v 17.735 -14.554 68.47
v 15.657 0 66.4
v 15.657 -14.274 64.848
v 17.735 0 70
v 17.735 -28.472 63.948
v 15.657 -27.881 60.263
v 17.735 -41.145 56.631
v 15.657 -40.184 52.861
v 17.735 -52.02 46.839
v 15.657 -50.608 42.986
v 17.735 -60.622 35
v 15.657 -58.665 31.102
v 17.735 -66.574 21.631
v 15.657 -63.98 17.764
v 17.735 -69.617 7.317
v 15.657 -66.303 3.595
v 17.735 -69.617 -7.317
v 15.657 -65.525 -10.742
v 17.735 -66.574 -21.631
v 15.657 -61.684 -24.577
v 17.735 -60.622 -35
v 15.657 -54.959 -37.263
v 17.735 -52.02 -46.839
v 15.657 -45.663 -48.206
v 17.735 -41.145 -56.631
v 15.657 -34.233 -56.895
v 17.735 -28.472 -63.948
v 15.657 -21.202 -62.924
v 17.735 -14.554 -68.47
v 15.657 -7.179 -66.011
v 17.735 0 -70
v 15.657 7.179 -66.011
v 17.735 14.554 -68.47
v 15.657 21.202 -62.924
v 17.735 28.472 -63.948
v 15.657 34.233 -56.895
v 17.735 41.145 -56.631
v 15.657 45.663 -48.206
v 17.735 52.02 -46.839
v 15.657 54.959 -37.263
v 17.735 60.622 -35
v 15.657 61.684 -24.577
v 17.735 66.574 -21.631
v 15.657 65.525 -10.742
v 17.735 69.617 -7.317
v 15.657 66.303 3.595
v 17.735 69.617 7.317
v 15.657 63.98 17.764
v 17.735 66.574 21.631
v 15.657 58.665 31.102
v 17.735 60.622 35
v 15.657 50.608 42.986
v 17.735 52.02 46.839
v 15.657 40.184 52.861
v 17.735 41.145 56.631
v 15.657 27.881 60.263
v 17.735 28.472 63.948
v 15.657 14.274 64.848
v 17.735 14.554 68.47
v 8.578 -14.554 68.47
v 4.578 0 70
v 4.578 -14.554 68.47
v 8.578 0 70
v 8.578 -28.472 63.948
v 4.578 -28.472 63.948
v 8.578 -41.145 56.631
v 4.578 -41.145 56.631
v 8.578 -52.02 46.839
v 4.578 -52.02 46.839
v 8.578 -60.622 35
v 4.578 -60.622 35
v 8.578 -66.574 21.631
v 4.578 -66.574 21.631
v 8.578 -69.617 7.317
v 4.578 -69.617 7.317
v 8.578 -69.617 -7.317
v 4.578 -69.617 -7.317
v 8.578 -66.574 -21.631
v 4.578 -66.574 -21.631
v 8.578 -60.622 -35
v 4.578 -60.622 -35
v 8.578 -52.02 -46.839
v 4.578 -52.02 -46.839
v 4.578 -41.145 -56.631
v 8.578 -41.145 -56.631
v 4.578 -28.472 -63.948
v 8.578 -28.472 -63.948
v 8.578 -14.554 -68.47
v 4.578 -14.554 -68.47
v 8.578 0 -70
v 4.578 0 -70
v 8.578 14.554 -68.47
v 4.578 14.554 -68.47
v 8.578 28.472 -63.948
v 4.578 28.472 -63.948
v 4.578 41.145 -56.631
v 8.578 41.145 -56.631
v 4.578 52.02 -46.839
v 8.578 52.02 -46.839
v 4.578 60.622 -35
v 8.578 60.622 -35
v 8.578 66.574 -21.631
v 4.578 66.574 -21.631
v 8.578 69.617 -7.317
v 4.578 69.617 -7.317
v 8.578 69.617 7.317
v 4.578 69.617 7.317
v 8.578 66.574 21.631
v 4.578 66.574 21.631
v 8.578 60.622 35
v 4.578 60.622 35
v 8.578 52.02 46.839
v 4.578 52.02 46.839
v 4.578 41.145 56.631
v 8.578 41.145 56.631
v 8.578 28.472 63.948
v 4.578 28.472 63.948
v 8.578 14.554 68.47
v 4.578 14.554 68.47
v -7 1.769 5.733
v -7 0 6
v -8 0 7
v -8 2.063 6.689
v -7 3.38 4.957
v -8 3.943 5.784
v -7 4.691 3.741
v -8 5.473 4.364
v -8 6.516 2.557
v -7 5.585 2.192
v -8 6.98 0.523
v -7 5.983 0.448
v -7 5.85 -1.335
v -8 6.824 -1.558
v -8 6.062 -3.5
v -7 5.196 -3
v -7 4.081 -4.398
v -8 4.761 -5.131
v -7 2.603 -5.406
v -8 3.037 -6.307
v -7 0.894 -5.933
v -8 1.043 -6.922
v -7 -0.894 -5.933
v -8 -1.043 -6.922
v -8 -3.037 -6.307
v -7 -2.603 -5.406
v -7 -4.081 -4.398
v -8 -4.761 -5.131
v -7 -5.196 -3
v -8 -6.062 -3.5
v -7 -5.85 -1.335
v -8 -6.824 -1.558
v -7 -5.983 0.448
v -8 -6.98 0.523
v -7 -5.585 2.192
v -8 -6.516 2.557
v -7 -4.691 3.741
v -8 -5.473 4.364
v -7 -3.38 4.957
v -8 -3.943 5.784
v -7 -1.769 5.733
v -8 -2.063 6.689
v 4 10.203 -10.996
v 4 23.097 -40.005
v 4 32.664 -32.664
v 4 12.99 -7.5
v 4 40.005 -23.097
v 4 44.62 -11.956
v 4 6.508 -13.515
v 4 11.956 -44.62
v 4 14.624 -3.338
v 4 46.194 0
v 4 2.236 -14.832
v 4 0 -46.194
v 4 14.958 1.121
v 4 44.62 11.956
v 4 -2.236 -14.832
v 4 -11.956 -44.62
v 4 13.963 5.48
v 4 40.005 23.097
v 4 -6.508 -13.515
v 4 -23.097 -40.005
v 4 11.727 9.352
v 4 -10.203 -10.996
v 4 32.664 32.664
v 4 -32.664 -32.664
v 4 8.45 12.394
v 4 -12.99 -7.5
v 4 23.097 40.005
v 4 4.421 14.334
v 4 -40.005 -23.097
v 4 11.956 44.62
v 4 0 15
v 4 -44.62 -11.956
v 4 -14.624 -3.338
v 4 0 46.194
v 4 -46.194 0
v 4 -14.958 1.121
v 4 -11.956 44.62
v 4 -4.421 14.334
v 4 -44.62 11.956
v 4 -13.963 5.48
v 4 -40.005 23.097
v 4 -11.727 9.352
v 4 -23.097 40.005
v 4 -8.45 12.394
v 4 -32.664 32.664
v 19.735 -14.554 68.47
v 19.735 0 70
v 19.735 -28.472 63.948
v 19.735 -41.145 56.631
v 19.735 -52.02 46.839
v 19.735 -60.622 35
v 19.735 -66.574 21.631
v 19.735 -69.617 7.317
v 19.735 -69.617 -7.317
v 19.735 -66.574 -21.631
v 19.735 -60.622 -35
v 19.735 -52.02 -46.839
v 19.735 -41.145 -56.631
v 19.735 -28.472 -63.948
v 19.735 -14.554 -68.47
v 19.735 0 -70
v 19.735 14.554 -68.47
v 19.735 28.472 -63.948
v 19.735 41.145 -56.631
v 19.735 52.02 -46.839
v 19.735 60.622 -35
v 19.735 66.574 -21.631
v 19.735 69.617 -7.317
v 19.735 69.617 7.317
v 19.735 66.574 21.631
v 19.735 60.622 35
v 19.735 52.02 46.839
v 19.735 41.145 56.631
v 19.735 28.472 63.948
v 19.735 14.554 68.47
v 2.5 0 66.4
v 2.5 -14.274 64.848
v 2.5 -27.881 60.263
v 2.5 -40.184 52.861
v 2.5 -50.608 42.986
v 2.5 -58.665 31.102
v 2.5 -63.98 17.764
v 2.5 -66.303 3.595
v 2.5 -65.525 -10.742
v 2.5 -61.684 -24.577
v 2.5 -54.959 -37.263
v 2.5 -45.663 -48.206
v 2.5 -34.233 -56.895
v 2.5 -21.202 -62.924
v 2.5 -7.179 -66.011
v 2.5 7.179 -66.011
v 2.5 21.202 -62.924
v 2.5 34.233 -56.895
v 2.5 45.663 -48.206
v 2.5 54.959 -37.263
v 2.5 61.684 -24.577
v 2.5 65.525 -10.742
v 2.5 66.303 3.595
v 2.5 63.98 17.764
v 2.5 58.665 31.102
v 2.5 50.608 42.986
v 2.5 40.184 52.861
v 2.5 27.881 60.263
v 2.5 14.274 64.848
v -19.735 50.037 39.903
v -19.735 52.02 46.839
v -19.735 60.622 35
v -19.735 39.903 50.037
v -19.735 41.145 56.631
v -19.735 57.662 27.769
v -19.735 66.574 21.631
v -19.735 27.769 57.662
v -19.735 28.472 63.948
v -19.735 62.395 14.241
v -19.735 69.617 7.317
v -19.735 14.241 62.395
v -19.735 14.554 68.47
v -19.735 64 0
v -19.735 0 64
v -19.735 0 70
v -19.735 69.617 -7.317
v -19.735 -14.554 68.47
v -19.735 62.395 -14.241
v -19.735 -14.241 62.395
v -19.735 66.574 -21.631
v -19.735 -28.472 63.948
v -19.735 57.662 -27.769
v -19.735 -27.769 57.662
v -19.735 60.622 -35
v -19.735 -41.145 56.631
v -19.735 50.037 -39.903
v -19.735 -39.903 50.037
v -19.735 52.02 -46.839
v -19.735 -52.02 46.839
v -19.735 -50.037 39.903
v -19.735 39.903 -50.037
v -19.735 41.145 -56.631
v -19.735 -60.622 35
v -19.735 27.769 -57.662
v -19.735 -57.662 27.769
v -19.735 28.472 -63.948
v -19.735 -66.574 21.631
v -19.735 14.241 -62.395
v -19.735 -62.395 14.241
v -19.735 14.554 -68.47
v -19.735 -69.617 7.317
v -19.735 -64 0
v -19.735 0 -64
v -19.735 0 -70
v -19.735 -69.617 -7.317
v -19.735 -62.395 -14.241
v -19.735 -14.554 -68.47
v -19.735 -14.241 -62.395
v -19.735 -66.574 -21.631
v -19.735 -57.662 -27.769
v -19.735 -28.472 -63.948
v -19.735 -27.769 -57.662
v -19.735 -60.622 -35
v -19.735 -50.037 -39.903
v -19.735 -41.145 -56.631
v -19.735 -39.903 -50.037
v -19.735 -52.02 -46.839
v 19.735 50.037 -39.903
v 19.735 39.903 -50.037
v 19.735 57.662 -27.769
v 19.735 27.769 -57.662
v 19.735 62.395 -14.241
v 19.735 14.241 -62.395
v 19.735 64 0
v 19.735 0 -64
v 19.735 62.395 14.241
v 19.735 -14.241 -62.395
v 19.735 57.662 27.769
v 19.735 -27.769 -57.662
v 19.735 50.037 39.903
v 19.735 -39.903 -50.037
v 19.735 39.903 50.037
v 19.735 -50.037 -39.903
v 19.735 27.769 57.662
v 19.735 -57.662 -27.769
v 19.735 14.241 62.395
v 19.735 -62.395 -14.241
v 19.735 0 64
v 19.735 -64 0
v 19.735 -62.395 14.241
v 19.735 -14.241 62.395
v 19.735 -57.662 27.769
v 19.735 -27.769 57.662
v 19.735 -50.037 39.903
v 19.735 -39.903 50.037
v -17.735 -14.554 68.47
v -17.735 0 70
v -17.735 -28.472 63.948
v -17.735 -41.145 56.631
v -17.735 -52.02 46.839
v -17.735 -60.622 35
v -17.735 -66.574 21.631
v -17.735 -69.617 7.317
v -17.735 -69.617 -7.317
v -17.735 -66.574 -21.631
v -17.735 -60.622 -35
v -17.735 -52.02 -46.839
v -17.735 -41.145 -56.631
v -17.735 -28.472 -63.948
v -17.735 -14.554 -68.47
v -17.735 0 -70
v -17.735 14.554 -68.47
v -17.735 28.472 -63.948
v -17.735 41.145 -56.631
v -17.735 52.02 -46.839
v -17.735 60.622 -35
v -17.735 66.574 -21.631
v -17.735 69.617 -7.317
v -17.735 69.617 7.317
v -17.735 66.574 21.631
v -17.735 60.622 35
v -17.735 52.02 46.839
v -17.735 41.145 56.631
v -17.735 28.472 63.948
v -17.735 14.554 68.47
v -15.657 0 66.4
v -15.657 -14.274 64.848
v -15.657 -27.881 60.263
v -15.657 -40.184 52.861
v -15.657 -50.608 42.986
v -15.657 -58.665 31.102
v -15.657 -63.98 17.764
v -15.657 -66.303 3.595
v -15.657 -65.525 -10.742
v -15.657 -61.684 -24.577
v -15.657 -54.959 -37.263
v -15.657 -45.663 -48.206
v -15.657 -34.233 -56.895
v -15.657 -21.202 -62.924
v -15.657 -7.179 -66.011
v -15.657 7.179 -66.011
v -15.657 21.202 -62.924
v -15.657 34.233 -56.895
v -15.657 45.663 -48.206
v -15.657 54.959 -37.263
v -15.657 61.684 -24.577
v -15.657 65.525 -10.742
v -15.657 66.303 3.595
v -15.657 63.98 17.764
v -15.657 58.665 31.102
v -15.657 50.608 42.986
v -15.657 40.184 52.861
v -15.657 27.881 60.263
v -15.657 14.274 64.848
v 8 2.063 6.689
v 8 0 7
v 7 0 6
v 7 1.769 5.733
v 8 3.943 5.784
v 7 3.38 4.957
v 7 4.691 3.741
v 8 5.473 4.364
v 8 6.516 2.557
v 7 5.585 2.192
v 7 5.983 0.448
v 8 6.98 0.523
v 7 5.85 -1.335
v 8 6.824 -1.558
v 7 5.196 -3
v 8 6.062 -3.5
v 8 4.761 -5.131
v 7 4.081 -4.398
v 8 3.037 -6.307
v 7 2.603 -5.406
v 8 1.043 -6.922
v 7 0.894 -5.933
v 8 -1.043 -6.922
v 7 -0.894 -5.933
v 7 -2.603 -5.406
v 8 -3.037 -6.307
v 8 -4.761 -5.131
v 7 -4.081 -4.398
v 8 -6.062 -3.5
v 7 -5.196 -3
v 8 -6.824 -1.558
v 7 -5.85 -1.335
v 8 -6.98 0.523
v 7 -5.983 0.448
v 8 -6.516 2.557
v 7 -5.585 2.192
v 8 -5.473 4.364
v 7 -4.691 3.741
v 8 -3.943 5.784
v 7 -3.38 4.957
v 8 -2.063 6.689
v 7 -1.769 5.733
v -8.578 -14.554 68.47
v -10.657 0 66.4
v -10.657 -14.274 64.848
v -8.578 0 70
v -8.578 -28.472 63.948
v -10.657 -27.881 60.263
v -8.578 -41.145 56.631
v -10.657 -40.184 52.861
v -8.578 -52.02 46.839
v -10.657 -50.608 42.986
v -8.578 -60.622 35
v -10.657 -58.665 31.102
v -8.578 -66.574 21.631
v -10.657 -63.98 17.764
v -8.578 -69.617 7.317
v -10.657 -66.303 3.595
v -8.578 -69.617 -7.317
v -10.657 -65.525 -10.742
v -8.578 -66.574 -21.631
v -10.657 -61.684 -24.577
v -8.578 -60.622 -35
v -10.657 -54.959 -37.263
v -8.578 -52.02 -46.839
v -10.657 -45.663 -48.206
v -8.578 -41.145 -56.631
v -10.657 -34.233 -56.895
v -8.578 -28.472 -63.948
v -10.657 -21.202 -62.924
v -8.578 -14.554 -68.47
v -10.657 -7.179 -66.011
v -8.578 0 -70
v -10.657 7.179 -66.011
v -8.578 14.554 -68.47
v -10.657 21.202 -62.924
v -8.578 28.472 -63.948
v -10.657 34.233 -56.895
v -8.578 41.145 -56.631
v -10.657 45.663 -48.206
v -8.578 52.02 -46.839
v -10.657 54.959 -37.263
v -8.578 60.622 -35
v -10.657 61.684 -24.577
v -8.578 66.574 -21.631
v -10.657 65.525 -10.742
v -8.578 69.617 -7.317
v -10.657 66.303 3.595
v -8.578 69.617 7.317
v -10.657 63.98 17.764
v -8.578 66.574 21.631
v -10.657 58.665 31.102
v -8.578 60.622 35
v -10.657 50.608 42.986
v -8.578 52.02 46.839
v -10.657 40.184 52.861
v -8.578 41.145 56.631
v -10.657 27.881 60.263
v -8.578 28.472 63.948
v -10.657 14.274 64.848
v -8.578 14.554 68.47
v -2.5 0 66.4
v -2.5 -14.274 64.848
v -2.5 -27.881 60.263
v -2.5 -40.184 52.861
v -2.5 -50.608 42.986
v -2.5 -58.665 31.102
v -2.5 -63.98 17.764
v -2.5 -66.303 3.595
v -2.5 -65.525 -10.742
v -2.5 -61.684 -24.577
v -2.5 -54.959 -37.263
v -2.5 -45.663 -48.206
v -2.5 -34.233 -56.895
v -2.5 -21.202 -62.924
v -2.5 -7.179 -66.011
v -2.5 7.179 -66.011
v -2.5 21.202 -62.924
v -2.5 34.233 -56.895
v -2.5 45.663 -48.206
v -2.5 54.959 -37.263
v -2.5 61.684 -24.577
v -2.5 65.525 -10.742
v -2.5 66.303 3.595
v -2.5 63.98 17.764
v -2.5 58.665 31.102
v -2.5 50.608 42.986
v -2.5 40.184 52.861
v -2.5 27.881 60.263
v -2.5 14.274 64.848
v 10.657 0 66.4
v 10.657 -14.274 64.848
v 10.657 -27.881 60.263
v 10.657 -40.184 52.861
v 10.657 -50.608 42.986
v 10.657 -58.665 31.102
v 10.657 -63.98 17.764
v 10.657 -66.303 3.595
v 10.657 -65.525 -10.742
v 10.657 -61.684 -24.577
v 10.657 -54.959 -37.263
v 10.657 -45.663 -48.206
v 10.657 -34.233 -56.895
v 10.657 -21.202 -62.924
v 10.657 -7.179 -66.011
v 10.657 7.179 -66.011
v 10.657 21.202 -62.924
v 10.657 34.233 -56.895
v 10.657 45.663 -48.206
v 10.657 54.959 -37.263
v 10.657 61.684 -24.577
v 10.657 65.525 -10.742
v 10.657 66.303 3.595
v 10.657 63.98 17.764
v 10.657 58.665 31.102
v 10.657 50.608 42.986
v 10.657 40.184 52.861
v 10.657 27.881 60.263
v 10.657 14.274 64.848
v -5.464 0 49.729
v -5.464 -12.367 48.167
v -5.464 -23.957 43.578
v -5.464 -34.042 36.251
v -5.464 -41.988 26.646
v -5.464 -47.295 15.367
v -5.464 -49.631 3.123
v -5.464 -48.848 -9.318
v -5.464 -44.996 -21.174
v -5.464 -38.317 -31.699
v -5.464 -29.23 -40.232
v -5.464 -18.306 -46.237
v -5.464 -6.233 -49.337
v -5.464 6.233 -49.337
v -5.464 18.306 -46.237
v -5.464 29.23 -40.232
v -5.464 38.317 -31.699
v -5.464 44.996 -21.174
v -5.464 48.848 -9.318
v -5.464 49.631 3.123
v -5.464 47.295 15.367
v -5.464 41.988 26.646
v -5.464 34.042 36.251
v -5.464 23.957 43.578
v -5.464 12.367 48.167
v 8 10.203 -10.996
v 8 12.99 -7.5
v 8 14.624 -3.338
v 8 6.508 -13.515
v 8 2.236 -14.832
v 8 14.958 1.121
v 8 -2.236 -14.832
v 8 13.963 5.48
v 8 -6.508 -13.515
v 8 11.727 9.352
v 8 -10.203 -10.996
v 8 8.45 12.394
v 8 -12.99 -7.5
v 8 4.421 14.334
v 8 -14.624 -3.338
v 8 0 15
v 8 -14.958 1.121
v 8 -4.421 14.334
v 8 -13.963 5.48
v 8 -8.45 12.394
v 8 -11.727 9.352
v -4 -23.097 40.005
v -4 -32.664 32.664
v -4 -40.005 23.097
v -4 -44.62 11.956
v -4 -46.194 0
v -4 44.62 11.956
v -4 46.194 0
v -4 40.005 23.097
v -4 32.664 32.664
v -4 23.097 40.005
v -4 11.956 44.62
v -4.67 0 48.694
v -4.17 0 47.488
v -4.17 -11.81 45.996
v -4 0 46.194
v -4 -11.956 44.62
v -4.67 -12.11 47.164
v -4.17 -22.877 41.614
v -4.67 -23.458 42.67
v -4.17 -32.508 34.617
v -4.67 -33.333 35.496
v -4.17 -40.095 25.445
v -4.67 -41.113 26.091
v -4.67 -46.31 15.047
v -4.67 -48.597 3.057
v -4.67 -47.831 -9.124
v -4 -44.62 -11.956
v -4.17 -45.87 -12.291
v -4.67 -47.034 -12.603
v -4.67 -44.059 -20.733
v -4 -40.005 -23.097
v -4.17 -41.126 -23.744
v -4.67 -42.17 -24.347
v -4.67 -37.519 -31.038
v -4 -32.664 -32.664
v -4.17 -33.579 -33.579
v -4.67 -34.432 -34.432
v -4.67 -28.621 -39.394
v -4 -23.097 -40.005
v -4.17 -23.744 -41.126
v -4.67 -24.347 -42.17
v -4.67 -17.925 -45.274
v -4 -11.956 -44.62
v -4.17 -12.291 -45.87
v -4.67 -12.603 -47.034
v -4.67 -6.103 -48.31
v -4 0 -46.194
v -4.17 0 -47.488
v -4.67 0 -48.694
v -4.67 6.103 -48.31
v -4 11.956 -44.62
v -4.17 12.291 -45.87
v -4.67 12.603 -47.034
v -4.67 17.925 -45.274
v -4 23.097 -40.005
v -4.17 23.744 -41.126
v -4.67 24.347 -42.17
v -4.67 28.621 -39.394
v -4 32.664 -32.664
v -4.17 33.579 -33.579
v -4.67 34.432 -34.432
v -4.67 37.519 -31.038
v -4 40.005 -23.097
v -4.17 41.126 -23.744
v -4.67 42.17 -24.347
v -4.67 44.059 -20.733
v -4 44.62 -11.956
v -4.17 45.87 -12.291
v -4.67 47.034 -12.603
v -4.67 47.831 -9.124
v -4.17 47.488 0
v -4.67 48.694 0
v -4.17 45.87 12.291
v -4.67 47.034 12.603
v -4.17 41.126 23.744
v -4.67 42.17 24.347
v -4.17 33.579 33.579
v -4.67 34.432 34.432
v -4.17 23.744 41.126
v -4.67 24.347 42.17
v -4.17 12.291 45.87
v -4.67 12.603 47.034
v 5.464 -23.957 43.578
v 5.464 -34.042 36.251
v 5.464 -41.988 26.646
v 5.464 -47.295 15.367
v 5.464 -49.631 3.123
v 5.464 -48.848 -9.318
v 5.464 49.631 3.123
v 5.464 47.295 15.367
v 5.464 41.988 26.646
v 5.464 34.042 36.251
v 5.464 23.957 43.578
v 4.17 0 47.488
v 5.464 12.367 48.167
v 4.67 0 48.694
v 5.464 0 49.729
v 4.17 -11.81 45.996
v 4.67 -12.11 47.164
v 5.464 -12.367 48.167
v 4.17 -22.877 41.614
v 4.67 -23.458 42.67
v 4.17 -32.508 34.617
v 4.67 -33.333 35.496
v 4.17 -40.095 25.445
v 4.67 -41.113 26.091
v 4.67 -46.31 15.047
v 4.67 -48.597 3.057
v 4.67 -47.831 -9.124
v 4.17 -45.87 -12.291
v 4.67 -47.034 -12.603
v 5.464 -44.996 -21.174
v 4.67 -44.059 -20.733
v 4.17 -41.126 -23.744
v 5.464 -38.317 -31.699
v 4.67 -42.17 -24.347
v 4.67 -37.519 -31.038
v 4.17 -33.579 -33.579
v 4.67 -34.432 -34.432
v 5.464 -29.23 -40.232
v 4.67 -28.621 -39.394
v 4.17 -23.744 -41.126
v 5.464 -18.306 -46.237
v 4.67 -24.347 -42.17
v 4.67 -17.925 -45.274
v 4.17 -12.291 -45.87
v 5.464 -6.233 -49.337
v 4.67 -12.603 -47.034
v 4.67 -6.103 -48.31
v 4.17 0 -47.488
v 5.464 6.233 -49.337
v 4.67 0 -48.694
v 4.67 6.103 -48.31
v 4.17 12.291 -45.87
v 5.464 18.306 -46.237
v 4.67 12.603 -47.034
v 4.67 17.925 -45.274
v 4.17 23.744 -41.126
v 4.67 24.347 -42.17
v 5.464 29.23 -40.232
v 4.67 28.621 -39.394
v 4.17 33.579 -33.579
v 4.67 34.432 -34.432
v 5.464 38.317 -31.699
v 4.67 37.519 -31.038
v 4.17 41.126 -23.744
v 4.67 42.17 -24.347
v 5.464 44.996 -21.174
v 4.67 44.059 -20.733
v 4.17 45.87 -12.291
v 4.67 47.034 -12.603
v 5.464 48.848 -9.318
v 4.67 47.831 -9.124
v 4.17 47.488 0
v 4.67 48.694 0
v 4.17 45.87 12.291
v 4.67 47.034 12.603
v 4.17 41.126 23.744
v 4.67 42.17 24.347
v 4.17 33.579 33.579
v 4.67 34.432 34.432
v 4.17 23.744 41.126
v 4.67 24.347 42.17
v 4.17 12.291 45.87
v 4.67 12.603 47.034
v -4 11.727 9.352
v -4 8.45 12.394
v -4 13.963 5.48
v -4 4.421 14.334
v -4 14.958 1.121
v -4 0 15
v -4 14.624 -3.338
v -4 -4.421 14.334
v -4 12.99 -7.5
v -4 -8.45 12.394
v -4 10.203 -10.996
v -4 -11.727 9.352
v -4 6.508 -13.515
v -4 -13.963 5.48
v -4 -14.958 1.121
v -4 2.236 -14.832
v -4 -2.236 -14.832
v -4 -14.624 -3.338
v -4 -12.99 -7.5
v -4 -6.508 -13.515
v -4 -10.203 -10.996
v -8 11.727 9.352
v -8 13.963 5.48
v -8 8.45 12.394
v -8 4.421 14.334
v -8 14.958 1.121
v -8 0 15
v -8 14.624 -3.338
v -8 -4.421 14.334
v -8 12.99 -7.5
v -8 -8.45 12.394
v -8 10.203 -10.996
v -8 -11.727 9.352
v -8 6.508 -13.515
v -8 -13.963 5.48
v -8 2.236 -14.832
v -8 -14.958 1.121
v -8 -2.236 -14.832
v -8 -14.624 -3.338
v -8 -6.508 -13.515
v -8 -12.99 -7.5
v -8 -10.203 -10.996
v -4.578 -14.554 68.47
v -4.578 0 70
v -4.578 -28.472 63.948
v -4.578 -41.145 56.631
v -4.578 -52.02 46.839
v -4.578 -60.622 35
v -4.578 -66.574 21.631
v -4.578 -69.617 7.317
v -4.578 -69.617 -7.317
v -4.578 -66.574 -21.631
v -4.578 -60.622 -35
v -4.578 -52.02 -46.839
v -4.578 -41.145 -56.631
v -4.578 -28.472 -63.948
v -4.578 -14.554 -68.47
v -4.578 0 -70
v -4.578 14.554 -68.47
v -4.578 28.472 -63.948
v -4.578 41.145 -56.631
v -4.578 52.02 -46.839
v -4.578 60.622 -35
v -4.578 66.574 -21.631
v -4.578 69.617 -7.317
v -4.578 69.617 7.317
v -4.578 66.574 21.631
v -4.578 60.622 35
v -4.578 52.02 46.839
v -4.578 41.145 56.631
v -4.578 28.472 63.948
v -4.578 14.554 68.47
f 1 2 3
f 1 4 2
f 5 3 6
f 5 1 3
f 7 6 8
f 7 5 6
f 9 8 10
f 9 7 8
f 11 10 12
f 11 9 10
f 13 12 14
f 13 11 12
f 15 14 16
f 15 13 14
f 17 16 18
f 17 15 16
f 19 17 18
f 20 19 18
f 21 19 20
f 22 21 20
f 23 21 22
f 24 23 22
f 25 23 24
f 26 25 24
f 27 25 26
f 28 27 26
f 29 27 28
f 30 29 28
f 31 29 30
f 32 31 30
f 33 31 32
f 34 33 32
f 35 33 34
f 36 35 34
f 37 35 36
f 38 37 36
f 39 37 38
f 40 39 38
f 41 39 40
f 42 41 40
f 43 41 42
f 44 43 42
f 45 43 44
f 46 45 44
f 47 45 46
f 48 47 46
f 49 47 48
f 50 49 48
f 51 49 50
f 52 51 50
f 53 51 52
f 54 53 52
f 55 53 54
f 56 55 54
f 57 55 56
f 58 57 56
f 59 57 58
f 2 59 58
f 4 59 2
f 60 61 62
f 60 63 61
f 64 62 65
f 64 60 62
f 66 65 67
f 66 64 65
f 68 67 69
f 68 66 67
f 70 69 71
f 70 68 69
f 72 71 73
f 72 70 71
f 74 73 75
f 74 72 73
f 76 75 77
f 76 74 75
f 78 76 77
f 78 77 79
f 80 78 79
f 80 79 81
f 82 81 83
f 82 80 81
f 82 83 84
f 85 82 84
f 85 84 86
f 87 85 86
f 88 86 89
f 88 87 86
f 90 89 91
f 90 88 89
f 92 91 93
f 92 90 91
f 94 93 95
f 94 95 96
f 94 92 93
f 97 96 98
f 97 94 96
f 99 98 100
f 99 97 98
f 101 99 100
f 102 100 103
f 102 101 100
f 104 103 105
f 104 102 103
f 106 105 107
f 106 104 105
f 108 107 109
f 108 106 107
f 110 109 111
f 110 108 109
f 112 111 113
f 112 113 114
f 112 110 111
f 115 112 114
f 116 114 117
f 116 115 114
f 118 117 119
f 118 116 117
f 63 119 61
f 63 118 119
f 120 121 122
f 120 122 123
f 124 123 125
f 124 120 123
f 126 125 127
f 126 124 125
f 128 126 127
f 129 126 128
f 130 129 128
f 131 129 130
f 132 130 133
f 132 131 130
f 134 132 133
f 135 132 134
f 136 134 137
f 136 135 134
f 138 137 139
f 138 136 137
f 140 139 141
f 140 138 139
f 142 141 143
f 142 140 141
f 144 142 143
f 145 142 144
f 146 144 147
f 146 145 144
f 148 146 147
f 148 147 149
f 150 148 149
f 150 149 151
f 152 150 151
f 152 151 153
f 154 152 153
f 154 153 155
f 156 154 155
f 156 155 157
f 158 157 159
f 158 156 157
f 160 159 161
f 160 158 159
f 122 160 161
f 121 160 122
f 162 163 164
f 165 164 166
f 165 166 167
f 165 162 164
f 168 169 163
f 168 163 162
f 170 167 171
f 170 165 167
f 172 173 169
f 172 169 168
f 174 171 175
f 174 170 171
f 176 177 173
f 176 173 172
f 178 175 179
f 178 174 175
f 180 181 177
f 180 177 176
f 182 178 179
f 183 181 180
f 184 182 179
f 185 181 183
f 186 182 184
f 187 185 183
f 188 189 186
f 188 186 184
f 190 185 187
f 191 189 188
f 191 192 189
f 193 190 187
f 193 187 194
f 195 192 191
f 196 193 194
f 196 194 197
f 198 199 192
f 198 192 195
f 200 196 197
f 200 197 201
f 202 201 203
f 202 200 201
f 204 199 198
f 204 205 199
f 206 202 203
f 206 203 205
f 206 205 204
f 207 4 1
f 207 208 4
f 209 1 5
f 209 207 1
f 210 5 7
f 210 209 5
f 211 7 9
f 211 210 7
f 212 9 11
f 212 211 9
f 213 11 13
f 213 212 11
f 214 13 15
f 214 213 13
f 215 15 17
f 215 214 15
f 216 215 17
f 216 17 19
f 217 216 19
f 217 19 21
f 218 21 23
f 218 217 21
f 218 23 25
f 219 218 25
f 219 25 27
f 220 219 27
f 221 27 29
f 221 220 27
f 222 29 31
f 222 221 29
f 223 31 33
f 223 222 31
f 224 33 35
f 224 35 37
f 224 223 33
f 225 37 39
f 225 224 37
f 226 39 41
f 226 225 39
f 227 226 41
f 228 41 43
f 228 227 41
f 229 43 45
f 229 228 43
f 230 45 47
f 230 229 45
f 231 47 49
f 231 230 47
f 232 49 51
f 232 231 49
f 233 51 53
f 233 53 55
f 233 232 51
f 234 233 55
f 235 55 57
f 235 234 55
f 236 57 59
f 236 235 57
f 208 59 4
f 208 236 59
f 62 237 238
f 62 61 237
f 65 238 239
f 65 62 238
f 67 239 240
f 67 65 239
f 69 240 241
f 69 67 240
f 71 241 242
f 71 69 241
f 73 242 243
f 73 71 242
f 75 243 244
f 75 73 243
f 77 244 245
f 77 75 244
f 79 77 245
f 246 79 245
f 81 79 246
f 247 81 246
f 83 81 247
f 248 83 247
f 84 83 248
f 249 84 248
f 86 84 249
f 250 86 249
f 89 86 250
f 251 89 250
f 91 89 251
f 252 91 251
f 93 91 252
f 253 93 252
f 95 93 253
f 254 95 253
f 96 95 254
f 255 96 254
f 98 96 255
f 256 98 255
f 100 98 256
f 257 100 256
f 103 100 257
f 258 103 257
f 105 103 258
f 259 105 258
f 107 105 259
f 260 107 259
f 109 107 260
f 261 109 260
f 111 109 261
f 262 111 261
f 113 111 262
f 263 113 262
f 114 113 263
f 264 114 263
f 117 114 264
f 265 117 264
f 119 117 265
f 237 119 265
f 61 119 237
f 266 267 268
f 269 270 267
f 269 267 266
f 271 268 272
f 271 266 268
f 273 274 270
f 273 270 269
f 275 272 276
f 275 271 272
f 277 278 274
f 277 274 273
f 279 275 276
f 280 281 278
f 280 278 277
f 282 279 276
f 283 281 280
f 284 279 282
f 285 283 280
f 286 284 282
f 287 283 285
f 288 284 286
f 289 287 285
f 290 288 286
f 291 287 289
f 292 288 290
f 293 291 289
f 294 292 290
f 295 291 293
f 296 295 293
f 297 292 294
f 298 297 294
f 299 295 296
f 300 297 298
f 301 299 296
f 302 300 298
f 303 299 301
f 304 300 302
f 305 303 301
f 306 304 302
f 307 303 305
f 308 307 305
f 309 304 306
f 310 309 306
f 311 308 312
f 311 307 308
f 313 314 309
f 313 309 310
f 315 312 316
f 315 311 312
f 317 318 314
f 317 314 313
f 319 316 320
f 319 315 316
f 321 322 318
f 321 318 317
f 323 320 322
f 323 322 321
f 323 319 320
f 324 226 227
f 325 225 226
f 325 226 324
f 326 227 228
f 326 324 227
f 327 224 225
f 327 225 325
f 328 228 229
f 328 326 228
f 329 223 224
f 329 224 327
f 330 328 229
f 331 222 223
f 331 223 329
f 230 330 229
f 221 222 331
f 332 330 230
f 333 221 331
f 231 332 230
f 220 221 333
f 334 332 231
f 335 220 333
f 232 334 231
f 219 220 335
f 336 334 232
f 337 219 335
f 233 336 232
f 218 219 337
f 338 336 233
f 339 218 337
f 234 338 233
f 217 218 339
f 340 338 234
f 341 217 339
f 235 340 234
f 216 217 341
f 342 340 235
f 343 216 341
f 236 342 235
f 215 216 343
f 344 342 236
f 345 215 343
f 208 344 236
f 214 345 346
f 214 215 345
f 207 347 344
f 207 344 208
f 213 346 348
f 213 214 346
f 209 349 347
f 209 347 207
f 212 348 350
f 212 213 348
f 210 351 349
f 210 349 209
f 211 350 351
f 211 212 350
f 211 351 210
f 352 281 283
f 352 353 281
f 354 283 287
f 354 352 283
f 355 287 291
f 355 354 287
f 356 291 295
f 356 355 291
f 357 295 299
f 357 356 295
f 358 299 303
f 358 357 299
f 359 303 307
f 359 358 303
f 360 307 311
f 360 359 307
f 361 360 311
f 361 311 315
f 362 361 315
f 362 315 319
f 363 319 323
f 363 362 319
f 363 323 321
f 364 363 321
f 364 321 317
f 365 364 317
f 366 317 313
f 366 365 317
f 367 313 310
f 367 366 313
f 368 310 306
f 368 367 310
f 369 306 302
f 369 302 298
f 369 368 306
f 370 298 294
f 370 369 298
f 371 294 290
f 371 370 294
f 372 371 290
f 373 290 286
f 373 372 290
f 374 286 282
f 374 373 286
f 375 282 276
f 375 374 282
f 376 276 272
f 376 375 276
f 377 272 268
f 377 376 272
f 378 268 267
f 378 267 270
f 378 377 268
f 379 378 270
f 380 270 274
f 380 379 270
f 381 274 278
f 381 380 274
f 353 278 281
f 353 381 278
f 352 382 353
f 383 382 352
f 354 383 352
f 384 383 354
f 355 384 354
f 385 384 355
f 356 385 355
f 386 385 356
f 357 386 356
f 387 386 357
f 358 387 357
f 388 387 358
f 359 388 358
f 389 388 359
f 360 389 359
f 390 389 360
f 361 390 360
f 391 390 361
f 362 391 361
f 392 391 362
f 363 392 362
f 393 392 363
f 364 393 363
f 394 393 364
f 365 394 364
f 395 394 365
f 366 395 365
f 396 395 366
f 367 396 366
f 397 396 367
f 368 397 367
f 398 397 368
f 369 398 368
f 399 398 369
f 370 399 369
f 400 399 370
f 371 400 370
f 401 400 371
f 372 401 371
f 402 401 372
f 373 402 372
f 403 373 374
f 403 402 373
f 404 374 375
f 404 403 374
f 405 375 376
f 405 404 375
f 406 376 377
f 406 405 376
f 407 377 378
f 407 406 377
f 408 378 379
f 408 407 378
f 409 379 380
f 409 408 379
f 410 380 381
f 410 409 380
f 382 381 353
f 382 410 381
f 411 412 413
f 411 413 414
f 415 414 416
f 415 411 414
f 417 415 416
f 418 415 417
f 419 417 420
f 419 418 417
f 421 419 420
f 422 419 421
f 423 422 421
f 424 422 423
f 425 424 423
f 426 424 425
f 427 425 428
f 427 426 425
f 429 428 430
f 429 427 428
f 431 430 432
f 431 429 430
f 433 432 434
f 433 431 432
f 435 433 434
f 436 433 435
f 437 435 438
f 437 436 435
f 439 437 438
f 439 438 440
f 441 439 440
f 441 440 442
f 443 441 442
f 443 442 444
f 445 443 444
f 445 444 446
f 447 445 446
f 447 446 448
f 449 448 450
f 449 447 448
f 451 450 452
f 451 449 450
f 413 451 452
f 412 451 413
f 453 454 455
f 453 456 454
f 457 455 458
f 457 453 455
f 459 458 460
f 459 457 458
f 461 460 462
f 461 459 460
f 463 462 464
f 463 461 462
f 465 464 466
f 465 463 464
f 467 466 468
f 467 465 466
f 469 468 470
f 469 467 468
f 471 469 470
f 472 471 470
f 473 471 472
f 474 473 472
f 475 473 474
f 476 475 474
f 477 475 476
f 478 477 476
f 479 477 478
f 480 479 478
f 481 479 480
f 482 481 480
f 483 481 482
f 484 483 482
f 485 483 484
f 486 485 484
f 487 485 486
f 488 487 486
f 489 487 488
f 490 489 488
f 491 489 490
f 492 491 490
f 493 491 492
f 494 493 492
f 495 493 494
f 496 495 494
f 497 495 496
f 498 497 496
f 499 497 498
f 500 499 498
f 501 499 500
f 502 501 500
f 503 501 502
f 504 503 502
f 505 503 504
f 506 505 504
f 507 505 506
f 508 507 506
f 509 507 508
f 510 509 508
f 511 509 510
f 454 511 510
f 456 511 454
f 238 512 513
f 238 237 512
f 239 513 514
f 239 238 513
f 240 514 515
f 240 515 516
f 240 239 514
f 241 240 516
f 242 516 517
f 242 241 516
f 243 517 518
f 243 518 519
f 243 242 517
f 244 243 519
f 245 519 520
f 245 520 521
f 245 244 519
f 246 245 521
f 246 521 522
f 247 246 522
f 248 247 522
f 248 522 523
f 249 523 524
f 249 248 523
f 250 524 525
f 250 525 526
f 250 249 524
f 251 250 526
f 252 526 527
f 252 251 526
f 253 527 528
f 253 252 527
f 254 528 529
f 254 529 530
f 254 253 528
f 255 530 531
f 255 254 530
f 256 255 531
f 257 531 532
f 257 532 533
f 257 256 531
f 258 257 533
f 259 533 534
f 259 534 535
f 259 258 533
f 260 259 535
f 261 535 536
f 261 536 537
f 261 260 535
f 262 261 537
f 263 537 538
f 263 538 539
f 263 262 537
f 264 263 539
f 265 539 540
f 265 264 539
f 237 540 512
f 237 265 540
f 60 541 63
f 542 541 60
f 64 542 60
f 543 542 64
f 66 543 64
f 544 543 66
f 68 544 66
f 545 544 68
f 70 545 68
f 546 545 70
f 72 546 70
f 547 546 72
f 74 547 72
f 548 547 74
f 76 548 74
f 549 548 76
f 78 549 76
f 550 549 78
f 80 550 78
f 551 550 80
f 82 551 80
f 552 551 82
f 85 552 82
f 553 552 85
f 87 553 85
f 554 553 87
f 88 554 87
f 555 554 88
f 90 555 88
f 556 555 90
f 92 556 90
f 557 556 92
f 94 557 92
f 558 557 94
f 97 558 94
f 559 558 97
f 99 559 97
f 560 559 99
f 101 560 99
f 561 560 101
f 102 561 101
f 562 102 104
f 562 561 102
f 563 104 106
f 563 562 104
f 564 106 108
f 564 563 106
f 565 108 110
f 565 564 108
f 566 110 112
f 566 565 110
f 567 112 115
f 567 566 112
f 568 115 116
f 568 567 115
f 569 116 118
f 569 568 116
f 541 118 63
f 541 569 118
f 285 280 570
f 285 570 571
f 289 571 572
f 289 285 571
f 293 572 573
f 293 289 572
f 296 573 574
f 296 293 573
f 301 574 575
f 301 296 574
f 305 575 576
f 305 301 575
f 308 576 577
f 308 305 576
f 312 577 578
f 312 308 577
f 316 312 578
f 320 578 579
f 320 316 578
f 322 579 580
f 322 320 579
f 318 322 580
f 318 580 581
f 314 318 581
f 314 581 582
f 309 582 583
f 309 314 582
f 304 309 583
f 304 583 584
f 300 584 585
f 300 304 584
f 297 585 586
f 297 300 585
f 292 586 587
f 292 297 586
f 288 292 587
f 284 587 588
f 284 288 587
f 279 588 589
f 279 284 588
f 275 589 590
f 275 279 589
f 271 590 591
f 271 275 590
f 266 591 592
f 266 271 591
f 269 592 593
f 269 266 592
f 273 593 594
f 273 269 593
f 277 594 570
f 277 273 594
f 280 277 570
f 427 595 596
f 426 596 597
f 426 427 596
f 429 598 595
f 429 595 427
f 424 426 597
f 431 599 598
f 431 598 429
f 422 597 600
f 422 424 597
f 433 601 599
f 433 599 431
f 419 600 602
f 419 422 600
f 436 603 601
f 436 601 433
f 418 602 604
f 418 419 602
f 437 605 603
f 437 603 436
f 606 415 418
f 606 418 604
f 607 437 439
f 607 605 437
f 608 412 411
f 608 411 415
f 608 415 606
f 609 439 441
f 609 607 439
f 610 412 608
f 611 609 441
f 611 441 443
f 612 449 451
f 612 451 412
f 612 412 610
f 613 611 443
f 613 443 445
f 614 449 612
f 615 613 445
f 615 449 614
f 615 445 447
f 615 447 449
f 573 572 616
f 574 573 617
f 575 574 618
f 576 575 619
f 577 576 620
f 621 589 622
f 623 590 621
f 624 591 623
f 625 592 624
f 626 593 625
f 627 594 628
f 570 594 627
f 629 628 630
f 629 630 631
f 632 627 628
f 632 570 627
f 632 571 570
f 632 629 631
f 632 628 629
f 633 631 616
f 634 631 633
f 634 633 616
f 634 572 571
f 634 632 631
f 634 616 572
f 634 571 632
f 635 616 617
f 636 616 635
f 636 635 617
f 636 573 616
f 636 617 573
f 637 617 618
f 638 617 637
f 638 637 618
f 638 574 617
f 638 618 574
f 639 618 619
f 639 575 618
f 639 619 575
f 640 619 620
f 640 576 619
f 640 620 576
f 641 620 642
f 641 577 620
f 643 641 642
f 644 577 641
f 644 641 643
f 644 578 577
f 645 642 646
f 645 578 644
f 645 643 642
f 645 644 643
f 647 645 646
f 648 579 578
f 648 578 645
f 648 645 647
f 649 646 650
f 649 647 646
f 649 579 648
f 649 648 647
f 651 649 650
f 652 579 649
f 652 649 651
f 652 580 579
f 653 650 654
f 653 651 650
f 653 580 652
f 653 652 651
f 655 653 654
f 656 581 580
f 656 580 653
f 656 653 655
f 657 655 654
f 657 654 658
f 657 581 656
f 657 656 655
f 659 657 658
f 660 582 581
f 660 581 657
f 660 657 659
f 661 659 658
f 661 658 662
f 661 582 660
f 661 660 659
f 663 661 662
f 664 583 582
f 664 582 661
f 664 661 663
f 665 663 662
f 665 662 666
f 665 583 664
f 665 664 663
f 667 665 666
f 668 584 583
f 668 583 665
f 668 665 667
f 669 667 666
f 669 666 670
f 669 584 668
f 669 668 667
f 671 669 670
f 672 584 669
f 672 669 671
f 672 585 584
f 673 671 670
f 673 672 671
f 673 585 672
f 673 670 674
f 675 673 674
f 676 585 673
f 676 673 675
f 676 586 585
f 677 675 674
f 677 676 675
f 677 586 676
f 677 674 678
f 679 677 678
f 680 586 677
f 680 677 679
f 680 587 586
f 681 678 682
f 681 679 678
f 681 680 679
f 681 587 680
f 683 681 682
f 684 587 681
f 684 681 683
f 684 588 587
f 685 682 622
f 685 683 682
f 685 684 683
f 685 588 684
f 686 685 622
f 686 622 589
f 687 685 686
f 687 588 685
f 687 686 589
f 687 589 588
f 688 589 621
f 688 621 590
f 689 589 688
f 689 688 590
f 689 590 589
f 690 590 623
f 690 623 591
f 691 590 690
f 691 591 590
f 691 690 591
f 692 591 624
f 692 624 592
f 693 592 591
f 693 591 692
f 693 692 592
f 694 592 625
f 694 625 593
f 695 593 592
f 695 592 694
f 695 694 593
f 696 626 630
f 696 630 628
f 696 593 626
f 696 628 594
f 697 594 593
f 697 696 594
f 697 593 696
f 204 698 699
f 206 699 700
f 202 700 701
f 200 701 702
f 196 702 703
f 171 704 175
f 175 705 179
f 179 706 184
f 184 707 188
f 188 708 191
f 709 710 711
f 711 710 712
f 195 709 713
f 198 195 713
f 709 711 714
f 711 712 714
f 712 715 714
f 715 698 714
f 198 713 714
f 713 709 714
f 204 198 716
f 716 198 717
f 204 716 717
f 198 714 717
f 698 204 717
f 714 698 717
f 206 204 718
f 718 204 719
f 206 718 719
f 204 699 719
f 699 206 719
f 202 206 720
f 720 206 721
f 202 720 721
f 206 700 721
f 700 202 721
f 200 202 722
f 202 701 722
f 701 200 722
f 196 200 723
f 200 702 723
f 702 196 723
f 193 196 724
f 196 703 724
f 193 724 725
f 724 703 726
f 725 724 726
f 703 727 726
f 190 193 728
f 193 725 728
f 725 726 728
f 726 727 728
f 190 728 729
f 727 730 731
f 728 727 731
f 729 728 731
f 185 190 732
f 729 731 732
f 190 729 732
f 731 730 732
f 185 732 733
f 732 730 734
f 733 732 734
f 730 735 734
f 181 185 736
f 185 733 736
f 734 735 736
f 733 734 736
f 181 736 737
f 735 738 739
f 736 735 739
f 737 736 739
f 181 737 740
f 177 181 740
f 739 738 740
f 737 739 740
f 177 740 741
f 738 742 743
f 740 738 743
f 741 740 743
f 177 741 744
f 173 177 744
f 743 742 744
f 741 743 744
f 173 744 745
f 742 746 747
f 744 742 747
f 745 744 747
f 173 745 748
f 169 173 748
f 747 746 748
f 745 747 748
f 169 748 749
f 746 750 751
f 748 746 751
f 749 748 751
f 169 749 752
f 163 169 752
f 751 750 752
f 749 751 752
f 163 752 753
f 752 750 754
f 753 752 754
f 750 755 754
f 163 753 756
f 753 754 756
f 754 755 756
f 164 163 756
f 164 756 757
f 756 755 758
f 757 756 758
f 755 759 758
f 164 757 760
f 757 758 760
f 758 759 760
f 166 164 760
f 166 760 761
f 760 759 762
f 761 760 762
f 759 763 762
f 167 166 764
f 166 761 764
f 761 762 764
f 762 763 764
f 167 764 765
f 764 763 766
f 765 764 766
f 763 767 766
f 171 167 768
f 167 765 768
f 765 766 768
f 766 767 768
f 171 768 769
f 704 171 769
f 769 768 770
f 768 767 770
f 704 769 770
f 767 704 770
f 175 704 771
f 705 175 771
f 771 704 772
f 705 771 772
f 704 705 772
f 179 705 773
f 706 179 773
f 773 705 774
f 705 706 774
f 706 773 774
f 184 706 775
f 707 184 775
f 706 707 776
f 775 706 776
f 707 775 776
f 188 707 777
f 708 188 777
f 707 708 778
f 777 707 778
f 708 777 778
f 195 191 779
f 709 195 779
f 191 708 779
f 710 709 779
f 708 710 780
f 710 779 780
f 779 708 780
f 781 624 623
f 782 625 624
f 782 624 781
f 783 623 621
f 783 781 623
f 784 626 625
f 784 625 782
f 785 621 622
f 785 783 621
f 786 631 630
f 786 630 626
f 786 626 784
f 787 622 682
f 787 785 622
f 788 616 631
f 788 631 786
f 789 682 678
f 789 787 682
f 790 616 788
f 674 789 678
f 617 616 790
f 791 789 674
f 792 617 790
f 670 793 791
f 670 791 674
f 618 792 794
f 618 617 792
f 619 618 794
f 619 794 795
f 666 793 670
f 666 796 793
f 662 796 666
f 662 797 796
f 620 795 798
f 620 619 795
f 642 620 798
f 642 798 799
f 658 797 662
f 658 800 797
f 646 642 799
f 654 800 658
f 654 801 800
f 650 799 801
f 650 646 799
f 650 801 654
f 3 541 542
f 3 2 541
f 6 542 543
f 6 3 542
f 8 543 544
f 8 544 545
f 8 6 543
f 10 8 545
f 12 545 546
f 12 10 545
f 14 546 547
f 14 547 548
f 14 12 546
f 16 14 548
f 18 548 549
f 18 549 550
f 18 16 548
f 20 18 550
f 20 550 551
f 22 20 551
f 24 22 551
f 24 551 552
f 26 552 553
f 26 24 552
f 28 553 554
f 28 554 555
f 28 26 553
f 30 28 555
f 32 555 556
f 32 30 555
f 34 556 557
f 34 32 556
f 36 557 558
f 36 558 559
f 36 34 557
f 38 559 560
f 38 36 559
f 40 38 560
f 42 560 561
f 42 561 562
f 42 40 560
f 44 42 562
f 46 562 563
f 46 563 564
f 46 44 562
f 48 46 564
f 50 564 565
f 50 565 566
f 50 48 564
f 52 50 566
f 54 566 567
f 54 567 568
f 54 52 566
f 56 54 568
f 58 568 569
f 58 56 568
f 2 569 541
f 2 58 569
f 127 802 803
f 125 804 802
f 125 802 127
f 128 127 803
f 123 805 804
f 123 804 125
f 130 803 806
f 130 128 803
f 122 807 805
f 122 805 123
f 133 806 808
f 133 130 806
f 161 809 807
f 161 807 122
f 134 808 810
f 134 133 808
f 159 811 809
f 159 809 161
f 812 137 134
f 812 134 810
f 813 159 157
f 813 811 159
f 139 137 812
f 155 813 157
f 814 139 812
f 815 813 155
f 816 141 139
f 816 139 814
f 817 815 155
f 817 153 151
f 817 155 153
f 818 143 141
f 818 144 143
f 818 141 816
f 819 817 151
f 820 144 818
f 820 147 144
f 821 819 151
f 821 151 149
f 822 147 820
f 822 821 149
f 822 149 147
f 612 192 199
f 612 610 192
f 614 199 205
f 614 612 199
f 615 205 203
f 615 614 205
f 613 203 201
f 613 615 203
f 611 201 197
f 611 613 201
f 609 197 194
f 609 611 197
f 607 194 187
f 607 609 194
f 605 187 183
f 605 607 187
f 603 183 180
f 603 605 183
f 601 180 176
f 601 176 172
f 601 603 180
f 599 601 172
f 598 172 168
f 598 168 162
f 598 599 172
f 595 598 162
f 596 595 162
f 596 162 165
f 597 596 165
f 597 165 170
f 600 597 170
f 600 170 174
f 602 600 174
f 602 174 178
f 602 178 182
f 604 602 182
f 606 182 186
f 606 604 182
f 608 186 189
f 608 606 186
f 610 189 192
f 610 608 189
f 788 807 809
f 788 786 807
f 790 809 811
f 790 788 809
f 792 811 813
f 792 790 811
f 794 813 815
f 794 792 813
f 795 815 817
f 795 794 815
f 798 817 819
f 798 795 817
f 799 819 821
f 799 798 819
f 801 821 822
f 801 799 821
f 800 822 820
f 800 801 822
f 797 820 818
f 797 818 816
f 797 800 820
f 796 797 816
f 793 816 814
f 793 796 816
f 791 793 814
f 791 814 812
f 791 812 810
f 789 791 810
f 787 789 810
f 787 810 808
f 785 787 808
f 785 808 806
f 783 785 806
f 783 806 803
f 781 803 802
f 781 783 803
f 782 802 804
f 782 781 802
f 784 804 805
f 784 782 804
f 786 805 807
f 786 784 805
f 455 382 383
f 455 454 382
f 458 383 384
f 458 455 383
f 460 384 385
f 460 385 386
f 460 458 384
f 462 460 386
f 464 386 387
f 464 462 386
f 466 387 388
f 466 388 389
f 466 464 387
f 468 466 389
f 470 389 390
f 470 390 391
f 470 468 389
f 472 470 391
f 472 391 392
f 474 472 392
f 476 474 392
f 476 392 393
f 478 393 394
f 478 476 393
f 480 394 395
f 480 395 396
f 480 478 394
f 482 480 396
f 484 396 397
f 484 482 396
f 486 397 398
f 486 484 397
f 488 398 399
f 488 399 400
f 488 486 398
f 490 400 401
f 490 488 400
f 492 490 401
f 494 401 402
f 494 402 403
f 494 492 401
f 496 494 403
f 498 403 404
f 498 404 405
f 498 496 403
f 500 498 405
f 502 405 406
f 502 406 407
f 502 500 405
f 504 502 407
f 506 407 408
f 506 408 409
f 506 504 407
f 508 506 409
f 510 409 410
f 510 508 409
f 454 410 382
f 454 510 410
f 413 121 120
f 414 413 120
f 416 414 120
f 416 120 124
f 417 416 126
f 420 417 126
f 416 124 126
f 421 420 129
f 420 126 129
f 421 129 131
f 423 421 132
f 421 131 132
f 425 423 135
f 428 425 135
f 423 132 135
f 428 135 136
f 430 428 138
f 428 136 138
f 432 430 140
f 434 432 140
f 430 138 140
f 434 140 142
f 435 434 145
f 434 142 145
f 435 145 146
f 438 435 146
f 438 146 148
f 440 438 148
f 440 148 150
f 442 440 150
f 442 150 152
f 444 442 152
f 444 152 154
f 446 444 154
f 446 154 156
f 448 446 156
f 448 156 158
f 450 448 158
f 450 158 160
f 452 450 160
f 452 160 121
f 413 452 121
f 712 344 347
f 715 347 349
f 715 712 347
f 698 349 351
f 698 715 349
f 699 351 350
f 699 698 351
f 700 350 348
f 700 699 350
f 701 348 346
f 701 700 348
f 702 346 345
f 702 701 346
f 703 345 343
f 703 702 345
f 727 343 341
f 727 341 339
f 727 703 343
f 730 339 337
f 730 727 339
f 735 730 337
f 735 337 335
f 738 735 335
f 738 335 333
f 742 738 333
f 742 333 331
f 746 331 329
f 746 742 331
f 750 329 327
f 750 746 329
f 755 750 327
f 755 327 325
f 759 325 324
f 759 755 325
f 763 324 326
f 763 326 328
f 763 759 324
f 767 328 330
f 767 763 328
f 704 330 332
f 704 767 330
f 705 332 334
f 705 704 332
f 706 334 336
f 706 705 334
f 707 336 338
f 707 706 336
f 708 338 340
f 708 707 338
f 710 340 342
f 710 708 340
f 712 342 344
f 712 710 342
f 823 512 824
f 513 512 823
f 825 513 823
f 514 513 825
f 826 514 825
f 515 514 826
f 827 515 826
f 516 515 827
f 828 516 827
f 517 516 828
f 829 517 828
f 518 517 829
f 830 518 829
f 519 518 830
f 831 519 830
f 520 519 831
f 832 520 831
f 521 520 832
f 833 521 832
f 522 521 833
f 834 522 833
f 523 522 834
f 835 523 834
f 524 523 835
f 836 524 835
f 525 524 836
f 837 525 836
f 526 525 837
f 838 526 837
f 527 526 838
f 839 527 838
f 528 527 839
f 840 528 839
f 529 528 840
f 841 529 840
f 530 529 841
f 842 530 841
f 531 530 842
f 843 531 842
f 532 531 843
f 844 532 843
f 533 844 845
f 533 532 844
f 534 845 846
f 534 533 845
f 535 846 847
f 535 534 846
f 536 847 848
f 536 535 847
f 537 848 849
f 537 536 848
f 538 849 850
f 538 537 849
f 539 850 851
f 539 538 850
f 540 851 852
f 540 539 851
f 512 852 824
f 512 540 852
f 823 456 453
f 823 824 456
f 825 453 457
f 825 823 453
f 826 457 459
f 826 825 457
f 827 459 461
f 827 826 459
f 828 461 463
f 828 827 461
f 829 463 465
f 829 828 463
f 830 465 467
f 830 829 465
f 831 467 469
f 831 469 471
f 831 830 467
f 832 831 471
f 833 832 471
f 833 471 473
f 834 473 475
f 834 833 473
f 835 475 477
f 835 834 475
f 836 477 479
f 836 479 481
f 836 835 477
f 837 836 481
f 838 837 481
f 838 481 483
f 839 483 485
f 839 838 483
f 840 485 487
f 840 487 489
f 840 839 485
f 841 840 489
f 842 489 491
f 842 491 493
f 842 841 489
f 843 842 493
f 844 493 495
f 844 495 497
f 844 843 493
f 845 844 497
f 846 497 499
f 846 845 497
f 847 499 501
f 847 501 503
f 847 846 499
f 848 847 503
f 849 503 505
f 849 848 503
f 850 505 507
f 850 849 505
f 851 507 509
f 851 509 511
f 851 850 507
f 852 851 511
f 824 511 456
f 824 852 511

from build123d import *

# Parameters (mm, degrees)
OTW_R_12_0_12_1_D = 12
ZAOKR_GLENIE1_R   = 5
ZAOKR_GLENIE2_R   = 5
SFAZOWANIE1_SIZE  = 1


with BuildPart() as part:
    # Szkic2 → Obrót1 (revolve)
    with BuildSketch(Plane(origin=(0, 0, 0), x_dir=(1, 0, 0), z_dir=(0, 1, 0)), mode=Mode.PRIVATE) as obr_t1_sk:
        Polygon((-8, 0), (-8, 15), (-4, 15), (-4, 48.264617093), (-19.735382907, 64), (-19.735382907, 70), (-17.735382907, 70), (-15.656921938, 66.4), (-10.656921938, 66.4), (-8.578460969, 70), (-4.578460969, 70), (-2.5, 66.4), (2.5, 66.4), (4.578460969, 70), (8.578460969, 70), (10.656921938, 66.4), (15.656921938, 66.4), (17.735382907, 70), (19.735382907, 70), (19.735382907, 64), (4, 48.264617093), (4, 15), (8, 15), (8, 0), align=None)
    revolve(obr_t1_sk.sketch.rotate(Axis((-13.757967627, 0, 0), (1, 0, 0)), 180), axis=Axis((-13.757967627, 0, 0), (1, 0, 0)))  # turned: the seam where the file's is

    # Otwór Ø12.0 (12)1 (through all)
    with Locations(Plane(origin=(8, 0, 0), x_dir=(0, 0, -1), z_dir=(1, 0, 0))):
        with Locations((0, 0)):
            Hole(OTW_R_12_0_12_1_D / 2)

    # Zaokrąglenie1
    zaokr_glenie1_edges = [part.edges().sort_by_distance(p)[0] for p in [
        (4, 0, -48.264617093),
    ]]
    fillet(zaokr_glenie1_edges, radius=ZAOKR_GLENIE1_R)

    # Zaokrąglenie2
    zaokr_glenie2_edges = [part.edges().sort_by_distance(p)[0] for p in [
        (-4, 0, -48.264617093),
    ]]
    fillet(zaokr_glenie2_edges, radius=ZAOKR_GLENIE2_R)

    # Sfazowanie1
    sfazowanie1_edges = [part.edges().sort_by_distance(p)[0] for p in [
        (-8, 0, -6),
        (8, 0, -6),
    ]]
    chamfer(sfazowanie1_edges, length=SFAZOWANIE1_SIZE)


solid = part.part
